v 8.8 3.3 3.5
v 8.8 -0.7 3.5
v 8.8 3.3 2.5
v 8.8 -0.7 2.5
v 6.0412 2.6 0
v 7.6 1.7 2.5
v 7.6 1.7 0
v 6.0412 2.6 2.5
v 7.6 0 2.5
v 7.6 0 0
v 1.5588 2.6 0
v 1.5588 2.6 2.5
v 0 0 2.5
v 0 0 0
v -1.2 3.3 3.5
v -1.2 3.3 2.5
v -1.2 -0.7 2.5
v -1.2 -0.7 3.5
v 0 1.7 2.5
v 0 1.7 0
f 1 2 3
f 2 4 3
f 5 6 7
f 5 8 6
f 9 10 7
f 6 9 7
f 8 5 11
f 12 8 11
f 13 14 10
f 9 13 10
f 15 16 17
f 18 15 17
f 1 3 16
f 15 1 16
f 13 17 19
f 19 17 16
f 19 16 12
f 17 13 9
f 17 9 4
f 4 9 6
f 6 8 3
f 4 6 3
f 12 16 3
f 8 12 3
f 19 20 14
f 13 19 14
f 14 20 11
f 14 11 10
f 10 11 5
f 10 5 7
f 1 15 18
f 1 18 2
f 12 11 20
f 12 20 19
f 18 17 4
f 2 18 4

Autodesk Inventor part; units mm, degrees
ref_plane "YZ Plane" through (0, 0, 0) normal (1, 0, 0) x (0, 1, 0)
ref_plane "XZ Plane" through (0, 0, 0) normal (0, 1, 0) x (-1, 0, 0)
ref_plane "XY Plane" through (0, 0, 0) normal (0, 0, 1) x (1, 0, 0)
sketch "Náčrt1" plane through (0, 0, 0) normal (0, 0, 1) x (1, 0, 0)
  line L0 (0, 0) -> (7.6, 0)
  line L1 (7.6, 0) -> (7.6, 2.6)
  line L2 (7.6, 2.6) -> (0, 2.6)
  line L3 (0, 2.6) -> (0, 0)
  dimension "d0" = 7.6
  dimension "d1" = 2.6
extrude "Vysunutí1" add sketch "Náčrt1" along normal blind 2.5
chamfer "Zkosení1" distance 0.9 angle 60 1 edges at (0, 2.6, 1.25) measured on face at (0, 1.7333, 0.8333)
chamfer "Zkosení2" distance 0.9 angle 60 1 edges at (7.6, 2.6, 1.25) measured on face at (7.6, 0.8667, 0.8333)
sketch "Náčrt2" plane through (0, 0, 2.5) normal (0, 0, 1) x (1, 0, 0)
  line L0 (-1.2, -0.7) -> (8.8, -0.7)
  line L1 (8.8, -0.7) -> (8.8, 3.3)
  line L2 (8.8, 3.3) -> (-1.2, 3.3)
  line L3 (-1.2, 3.3) -> (-1.2, -0.7)
  line L4 (-1.2, -0.7) -> (8.8, 3.3) construction
  line L5 (8.8, -0.7) -> (-1.2, 3.3) construction
  line L6 (0, 0) -> (7.6, 0) projected
  point P0 (3.8, 1.3)
  dimension "d10" = 10
  dimension "d11" = 4
  dimension "d12" = 1.3
extrude "Vysunutí2" add sketch "Náčrt2" along normal blind 1
properties part number "ChargeCover"
